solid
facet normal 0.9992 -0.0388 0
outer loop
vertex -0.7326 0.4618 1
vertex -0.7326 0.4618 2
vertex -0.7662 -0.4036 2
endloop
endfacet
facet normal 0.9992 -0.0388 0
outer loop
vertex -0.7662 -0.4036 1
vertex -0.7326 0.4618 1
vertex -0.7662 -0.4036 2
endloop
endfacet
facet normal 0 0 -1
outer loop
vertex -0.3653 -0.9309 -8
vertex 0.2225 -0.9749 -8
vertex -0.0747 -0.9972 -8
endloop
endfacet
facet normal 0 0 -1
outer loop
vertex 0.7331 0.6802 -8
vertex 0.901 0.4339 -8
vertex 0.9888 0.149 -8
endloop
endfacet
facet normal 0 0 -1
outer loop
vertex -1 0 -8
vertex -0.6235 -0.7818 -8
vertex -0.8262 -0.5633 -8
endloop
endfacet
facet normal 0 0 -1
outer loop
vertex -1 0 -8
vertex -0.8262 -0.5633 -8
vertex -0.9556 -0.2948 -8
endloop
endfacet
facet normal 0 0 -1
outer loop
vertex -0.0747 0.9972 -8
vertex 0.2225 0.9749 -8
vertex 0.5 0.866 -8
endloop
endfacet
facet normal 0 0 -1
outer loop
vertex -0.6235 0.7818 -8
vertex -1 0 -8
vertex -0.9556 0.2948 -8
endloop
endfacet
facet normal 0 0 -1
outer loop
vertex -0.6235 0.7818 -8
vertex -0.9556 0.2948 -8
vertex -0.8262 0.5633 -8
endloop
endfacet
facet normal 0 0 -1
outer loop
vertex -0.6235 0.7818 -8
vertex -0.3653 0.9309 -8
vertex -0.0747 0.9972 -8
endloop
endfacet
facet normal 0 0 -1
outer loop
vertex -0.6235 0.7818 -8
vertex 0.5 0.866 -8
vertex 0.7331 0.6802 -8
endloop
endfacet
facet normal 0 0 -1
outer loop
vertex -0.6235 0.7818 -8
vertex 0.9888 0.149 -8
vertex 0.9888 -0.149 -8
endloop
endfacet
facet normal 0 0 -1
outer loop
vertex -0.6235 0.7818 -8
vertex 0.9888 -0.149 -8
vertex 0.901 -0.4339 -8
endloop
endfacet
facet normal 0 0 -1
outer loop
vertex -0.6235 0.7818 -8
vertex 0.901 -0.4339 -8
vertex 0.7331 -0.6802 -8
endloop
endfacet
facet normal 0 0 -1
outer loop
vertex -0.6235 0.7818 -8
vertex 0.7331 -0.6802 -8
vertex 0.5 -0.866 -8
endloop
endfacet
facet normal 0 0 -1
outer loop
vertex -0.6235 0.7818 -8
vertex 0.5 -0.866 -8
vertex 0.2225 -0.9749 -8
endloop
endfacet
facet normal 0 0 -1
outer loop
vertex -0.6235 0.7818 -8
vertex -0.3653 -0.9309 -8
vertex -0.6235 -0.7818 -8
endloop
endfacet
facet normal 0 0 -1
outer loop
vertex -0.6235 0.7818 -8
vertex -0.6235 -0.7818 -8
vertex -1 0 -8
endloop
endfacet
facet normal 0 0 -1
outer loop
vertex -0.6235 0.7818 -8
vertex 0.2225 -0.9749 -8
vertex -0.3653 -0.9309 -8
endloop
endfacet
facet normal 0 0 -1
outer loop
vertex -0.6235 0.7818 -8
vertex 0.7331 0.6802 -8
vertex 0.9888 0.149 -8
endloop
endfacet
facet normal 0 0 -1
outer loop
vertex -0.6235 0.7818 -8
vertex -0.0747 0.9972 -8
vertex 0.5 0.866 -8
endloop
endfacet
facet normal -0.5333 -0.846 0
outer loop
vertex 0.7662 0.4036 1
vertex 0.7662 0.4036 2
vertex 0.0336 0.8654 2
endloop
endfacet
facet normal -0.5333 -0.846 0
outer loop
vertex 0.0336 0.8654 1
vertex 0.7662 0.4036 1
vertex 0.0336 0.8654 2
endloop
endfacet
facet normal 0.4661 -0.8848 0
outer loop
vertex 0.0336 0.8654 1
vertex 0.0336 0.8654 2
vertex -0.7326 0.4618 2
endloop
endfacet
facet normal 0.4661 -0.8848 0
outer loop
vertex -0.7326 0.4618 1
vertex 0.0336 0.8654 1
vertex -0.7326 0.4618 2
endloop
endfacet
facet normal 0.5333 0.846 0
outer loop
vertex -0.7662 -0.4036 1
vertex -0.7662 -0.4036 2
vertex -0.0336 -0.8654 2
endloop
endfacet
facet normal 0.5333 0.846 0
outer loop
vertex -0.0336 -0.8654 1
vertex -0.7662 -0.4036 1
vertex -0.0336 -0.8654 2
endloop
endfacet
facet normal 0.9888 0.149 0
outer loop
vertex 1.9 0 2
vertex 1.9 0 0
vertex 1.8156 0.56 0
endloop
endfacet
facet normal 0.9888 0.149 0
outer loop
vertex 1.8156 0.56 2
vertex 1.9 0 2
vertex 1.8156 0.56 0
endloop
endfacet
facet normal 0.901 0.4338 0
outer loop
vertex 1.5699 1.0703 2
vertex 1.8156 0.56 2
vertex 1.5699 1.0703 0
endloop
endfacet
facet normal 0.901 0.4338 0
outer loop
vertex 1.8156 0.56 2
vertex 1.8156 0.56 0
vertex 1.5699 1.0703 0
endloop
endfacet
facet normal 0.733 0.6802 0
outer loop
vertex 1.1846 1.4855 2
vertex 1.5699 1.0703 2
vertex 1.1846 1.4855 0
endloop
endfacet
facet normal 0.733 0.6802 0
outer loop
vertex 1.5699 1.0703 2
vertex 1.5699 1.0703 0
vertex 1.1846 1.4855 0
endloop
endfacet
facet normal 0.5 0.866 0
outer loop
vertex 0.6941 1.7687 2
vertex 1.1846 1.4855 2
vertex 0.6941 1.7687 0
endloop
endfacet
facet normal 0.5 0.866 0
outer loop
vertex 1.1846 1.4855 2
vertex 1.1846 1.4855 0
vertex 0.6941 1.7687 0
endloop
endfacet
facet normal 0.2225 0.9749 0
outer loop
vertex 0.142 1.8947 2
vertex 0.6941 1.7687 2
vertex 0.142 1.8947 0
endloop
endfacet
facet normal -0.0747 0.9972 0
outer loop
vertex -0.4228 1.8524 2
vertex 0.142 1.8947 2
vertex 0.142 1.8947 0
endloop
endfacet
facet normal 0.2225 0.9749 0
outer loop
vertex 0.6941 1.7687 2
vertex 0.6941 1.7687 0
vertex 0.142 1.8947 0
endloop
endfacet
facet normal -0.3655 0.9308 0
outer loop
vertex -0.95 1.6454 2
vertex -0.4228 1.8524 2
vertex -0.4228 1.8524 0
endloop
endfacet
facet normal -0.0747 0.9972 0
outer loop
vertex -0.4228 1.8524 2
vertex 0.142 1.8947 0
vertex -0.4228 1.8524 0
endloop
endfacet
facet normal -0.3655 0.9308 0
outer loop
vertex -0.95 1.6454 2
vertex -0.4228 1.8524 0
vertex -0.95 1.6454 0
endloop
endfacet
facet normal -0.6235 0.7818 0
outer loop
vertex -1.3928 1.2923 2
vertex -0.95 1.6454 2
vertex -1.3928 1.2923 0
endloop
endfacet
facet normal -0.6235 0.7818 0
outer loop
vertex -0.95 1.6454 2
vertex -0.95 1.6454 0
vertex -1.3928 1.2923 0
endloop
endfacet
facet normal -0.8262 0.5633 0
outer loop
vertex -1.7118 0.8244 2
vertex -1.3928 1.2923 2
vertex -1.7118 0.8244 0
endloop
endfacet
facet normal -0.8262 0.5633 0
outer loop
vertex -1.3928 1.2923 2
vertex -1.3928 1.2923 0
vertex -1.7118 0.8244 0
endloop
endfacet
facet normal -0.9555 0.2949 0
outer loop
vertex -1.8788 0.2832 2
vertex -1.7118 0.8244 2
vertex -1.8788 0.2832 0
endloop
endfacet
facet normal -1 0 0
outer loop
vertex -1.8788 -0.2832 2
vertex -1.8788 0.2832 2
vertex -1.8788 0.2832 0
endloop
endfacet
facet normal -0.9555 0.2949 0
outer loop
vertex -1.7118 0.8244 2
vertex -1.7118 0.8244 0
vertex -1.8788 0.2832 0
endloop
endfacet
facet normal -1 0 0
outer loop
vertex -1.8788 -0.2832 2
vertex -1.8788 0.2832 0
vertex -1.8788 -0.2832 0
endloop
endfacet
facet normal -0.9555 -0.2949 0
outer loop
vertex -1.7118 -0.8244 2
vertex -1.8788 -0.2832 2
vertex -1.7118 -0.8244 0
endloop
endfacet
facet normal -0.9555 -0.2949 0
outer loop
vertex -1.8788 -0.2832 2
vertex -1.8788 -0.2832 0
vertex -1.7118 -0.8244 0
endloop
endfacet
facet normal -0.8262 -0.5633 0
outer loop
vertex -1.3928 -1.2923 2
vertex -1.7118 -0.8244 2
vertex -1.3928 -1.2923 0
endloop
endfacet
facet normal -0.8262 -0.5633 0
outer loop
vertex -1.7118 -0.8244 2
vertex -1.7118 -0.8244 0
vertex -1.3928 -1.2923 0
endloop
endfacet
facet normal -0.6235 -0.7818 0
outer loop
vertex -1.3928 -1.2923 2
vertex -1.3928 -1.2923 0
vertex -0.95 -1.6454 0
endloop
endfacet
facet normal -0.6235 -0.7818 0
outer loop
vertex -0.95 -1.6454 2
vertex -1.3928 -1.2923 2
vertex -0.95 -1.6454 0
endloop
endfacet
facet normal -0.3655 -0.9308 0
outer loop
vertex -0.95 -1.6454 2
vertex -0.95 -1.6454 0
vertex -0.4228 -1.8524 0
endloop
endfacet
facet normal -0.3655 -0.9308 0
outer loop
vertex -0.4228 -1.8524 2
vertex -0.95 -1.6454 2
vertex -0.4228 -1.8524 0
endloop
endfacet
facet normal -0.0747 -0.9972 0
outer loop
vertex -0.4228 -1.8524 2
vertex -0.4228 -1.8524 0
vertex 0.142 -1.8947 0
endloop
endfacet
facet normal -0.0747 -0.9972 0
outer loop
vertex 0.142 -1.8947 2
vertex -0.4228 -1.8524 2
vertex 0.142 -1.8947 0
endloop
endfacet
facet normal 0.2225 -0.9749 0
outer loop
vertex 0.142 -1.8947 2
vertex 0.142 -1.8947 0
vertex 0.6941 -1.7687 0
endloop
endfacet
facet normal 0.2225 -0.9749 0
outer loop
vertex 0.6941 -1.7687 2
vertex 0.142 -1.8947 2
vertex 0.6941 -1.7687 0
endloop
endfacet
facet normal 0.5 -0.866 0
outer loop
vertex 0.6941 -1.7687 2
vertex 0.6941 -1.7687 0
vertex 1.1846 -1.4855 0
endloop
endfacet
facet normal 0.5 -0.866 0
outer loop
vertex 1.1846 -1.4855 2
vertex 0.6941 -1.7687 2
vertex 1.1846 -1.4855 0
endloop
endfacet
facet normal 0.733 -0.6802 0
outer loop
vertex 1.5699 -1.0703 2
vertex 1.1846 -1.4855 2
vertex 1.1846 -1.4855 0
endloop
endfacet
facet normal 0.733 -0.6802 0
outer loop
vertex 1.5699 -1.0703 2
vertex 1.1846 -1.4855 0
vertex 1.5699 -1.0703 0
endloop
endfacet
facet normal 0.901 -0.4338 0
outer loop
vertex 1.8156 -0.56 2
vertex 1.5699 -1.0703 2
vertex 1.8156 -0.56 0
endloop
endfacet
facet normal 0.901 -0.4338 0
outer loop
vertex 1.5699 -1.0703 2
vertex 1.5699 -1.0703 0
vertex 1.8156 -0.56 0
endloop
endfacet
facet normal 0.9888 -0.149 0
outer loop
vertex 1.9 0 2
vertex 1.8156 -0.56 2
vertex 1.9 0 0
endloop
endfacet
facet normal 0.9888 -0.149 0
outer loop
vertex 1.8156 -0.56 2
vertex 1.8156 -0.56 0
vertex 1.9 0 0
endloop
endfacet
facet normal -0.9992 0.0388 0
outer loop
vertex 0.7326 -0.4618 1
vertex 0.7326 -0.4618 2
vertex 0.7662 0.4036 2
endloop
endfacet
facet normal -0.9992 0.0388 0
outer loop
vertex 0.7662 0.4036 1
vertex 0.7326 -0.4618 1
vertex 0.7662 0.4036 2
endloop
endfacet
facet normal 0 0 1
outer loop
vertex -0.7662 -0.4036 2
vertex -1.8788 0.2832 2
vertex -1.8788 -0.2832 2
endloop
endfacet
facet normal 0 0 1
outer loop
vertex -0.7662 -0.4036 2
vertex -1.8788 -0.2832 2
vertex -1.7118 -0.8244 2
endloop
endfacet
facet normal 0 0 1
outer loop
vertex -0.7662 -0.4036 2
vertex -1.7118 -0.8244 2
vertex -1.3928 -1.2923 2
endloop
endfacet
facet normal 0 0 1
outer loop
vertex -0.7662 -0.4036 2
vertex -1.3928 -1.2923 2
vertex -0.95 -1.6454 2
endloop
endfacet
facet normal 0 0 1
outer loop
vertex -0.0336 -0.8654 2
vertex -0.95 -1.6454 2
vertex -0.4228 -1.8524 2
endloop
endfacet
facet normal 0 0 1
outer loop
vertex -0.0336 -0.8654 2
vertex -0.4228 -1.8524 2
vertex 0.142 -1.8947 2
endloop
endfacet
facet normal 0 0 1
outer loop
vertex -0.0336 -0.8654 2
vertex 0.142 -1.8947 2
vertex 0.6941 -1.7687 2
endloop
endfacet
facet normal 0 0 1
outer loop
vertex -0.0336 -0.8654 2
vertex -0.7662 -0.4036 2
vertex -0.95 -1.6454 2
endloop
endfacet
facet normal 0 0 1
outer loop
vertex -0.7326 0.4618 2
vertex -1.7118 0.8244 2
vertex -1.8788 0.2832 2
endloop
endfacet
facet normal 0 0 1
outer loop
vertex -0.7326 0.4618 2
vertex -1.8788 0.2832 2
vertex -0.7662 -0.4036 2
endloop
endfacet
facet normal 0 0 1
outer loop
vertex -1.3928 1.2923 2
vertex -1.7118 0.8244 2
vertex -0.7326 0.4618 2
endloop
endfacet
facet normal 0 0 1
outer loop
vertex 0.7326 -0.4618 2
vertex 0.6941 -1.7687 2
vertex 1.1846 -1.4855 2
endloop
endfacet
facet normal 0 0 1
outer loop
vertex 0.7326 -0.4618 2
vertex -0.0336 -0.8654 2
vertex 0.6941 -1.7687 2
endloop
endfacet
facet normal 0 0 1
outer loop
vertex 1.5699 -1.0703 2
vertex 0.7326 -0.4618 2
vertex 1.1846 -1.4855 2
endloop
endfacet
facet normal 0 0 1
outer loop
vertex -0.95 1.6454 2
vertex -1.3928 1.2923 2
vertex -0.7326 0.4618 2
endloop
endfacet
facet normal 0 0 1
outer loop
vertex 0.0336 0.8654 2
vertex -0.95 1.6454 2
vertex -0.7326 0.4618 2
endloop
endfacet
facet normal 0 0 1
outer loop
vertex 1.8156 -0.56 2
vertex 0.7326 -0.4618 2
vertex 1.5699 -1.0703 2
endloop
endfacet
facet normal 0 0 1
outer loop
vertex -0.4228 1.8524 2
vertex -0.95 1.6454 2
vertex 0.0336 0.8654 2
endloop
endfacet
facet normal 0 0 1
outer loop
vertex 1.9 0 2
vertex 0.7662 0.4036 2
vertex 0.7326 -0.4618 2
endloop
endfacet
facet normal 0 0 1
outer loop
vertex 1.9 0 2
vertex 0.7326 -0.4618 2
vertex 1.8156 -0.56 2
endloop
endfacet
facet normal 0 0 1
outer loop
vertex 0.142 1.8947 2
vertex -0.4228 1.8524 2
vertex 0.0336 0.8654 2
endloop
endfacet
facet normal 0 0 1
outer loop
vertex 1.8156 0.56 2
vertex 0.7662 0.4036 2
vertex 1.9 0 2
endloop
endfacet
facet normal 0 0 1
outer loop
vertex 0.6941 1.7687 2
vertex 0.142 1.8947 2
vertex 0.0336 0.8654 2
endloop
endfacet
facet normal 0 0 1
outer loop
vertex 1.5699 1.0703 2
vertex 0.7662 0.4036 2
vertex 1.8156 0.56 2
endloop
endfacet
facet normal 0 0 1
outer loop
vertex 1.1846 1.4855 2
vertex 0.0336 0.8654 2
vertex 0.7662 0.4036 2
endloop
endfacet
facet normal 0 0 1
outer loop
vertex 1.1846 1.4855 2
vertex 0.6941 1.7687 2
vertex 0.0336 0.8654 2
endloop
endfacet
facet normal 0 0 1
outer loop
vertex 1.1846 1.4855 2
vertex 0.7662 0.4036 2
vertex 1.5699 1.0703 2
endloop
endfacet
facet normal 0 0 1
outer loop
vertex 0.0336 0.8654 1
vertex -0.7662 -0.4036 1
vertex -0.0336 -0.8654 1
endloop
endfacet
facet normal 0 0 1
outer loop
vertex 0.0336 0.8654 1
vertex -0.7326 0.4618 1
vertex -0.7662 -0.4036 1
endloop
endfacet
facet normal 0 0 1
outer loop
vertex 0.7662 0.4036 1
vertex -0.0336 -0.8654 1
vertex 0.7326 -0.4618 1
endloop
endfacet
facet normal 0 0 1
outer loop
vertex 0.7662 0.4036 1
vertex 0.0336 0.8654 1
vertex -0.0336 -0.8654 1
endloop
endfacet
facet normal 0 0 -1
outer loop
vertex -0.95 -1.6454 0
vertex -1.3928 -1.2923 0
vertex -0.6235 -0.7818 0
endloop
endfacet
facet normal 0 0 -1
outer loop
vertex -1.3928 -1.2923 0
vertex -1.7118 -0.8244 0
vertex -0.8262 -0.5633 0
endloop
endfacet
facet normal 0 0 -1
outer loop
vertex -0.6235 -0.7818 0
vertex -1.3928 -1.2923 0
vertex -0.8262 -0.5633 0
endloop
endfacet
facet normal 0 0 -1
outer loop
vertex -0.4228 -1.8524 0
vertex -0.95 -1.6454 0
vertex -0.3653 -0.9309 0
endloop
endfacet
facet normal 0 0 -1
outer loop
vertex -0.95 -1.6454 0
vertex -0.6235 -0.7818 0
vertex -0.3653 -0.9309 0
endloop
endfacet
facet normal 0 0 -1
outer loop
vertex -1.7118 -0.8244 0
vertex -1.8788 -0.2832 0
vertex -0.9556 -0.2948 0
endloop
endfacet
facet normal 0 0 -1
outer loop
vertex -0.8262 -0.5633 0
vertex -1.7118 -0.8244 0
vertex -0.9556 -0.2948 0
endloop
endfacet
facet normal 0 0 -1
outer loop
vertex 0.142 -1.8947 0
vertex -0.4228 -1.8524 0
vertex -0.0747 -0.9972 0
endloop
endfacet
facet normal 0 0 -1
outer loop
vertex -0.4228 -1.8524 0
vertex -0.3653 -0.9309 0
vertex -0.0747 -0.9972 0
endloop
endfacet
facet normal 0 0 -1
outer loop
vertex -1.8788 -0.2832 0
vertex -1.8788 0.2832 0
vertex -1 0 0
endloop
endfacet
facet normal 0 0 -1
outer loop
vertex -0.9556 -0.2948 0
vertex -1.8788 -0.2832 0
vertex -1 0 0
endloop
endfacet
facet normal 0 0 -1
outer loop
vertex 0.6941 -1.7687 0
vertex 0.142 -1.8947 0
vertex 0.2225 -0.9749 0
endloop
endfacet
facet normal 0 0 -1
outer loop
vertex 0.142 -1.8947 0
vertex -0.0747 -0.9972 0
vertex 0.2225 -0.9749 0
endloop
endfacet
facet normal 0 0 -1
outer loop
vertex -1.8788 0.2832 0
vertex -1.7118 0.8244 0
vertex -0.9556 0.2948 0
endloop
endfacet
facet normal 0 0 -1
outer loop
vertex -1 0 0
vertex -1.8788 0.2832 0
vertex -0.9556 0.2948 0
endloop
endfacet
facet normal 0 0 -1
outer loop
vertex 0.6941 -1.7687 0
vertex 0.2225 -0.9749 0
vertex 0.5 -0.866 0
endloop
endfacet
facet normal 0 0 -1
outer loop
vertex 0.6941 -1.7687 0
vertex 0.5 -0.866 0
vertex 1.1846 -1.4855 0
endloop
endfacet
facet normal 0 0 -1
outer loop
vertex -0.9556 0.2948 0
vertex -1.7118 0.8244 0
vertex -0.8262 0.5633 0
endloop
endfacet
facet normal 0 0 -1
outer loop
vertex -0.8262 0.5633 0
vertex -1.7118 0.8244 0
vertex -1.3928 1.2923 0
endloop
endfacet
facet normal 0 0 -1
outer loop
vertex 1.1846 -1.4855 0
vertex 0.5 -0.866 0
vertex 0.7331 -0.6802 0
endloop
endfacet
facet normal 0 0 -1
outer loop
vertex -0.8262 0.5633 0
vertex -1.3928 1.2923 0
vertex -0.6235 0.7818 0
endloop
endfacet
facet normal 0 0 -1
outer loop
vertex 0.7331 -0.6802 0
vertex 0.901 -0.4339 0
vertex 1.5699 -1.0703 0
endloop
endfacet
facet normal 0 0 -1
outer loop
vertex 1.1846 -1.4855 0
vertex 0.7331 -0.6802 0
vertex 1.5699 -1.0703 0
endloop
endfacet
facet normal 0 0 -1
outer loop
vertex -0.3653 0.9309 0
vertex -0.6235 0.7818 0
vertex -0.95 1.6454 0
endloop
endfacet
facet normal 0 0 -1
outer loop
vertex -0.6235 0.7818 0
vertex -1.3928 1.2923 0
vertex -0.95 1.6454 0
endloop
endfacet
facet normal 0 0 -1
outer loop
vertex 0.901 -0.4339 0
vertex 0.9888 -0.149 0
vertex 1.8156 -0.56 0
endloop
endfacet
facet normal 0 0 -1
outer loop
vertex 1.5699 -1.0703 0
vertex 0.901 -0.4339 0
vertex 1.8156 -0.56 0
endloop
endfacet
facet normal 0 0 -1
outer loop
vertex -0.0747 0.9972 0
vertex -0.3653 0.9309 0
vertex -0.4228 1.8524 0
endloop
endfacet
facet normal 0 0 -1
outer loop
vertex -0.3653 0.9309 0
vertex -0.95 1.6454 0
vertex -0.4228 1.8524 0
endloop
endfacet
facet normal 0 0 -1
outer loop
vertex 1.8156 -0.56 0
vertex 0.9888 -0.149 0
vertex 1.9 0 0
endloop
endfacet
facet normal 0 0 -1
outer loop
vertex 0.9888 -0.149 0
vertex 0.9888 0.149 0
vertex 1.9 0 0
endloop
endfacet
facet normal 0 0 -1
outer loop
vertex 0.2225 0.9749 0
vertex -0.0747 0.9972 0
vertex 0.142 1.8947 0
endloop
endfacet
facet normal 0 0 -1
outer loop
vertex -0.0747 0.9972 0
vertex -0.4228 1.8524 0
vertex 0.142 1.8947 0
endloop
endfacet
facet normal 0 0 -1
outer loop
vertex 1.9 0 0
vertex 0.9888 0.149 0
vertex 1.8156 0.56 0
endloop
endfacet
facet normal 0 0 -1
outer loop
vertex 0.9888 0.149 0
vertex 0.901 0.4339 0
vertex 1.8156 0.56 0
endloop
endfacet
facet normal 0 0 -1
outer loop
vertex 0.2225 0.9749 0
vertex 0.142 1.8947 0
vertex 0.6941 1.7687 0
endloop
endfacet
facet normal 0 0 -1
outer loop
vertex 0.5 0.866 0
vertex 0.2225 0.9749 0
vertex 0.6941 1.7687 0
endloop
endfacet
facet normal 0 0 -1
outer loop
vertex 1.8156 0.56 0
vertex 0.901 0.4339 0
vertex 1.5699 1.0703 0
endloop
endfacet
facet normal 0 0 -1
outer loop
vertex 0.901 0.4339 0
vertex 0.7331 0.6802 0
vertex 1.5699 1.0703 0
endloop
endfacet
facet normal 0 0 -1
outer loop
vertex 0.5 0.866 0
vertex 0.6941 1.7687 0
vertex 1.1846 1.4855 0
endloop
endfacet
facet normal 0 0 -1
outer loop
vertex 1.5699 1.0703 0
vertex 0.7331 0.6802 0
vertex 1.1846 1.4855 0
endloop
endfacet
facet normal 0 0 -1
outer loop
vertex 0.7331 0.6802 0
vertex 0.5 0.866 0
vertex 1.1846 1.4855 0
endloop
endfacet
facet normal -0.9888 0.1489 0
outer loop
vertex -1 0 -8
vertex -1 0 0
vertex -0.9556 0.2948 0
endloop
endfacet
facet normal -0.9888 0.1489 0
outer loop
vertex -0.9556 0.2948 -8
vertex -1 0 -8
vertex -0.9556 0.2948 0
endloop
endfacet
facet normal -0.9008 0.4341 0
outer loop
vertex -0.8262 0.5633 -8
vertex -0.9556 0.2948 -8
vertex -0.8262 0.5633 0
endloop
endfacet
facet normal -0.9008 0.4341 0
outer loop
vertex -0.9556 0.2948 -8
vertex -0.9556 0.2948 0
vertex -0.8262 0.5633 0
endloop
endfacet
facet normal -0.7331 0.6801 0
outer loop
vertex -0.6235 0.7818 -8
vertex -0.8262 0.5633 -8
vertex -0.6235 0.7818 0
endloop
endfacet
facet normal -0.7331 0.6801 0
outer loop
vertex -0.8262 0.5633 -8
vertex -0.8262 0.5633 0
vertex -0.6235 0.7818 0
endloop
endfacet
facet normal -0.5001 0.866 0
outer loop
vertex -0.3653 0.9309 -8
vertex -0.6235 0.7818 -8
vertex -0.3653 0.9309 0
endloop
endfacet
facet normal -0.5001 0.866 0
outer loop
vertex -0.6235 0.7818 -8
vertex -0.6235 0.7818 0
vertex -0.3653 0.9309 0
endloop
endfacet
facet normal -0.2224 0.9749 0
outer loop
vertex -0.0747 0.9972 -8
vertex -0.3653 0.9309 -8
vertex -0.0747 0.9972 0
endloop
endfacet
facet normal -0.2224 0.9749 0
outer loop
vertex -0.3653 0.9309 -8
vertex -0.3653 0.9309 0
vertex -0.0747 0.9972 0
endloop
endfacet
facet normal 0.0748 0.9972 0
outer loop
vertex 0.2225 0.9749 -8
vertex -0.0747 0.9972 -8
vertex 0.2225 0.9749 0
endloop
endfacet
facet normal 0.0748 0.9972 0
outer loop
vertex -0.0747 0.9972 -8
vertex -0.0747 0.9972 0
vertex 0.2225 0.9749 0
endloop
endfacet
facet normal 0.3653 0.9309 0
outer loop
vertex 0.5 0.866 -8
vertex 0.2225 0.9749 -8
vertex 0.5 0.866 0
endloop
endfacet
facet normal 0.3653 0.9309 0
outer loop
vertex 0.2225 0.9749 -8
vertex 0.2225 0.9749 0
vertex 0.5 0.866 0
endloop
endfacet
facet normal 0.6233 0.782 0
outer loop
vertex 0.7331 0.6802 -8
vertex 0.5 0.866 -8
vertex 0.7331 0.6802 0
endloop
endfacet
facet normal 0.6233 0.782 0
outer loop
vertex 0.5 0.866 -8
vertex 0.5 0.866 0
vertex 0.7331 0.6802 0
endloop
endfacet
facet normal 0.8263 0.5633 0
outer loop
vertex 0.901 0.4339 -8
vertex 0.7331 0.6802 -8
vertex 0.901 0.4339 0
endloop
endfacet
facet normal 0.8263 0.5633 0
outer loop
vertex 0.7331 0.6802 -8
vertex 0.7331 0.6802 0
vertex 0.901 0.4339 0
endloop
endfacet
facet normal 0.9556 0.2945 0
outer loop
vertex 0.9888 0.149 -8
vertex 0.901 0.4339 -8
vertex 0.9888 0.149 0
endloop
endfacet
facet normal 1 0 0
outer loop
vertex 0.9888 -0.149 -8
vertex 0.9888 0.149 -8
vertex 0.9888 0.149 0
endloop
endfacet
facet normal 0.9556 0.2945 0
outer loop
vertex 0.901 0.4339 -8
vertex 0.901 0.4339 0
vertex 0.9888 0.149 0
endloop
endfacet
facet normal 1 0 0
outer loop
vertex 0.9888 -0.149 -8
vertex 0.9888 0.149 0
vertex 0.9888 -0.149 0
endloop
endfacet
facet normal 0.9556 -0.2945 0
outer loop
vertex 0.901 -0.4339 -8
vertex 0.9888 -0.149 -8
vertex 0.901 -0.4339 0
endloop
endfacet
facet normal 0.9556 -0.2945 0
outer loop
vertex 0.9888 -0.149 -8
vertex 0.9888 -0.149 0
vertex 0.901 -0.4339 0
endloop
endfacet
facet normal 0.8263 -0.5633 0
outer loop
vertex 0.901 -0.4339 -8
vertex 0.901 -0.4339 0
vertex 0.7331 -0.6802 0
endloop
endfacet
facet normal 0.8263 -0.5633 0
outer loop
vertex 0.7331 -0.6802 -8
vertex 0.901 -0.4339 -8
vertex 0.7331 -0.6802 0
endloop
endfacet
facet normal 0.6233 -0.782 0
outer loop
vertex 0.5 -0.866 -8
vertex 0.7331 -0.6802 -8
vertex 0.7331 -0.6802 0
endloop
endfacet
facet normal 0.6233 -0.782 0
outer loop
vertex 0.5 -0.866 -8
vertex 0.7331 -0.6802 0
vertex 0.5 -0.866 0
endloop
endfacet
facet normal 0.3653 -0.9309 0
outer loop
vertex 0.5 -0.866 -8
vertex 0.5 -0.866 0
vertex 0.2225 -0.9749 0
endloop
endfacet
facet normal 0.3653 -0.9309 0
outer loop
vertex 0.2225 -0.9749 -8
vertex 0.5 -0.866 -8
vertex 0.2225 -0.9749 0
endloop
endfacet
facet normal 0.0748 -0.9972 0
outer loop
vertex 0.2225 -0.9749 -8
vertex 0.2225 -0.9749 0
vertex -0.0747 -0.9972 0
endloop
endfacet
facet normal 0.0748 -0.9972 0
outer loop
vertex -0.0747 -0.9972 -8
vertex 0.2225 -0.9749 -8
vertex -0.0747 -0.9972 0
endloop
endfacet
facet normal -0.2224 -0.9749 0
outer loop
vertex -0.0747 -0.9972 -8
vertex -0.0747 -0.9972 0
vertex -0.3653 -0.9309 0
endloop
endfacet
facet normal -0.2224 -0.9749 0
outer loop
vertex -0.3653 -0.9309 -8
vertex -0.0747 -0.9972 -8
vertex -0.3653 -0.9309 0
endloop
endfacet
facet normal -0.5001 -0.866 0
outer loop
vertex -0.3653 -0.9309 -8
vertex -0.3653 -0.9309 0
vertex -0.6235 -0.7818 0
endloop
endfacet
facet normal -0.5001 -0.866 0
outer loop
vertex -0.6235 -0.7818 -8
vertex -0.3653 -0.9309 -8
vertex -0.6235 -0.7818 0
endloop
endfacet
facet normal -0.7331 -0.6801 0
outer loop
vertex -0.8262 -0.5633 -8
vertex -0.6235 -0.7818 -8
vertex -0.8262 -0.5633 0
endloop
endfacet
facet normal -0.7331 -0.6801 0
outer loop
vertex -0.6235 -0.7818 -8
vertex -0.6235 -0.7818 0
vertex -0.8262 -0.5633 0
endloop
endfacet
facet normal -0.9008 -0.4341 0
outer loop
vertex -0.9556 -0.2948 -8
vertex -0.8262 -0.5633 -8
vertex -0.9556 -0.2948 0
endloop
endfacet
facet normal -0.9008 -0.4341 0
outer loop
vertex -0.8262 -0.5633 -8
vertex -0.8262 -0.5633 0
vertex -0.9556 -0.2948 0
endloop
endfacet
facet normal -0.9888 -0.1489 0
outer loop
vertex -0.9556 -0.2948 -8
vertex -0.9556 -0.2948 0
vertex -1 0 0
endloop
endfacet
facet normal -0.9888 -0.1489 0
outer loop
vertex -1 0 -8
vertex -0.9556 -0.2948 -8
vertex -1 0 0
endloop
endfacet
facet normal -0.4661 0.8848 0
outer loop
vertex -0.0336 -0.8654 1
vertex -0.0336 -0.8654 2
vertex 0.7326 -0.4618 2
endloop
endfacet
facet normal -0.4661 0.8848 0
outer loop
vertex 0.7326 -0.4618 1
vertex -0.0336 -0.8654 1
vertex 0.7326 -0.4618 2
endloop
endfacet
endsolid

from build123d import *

# Parameters (mm, degrees)
SKETCH_1_R          = 1.9
EXTRUDE_1_DEPTH     = 2
SKETCH_2_R          = 1
EXTRUDE_2_DEPTH     = 8
CUT_EXTRUDE_1_DEPTH = 1


with BuildPart() as part:
    # 草图1 → 凸台-拉伸1 (new body)
    with BuildSketch(Plane.XY):
        Circle(SKETCH_1_R)
    extrude(amount=EXTRUDE_1_DEPTH)

    # 草图2 → 凸台-拉伸2 (add)
    with BuildSketch(Plane(origin=(0, 0, 0), x_dir=(-1, 0, 0), z_dir=(0, 0, -1))):
        Circle(SKETCH_2_R)
    extrude(amount=EXTRUDE_2_DEPTH)

    # 草图3 → 切除-拉伸1 (cut)
    with BuildSketch(Plane.XY.offset(2)):
        Polygon((-0.766222709, -0.403612141), (-0.033572987, -0.865374401), (0.732649722, -0.461762261), (0.766222709, 0.403612141), (0.033572987, 0.865374401), (-0.732649722, 0.461762261), align=None)
    extrude(amount=-CUT_EXTRUDE_1_DEPTH, mode=Mode.SUBTRACT)


solid = part.part
